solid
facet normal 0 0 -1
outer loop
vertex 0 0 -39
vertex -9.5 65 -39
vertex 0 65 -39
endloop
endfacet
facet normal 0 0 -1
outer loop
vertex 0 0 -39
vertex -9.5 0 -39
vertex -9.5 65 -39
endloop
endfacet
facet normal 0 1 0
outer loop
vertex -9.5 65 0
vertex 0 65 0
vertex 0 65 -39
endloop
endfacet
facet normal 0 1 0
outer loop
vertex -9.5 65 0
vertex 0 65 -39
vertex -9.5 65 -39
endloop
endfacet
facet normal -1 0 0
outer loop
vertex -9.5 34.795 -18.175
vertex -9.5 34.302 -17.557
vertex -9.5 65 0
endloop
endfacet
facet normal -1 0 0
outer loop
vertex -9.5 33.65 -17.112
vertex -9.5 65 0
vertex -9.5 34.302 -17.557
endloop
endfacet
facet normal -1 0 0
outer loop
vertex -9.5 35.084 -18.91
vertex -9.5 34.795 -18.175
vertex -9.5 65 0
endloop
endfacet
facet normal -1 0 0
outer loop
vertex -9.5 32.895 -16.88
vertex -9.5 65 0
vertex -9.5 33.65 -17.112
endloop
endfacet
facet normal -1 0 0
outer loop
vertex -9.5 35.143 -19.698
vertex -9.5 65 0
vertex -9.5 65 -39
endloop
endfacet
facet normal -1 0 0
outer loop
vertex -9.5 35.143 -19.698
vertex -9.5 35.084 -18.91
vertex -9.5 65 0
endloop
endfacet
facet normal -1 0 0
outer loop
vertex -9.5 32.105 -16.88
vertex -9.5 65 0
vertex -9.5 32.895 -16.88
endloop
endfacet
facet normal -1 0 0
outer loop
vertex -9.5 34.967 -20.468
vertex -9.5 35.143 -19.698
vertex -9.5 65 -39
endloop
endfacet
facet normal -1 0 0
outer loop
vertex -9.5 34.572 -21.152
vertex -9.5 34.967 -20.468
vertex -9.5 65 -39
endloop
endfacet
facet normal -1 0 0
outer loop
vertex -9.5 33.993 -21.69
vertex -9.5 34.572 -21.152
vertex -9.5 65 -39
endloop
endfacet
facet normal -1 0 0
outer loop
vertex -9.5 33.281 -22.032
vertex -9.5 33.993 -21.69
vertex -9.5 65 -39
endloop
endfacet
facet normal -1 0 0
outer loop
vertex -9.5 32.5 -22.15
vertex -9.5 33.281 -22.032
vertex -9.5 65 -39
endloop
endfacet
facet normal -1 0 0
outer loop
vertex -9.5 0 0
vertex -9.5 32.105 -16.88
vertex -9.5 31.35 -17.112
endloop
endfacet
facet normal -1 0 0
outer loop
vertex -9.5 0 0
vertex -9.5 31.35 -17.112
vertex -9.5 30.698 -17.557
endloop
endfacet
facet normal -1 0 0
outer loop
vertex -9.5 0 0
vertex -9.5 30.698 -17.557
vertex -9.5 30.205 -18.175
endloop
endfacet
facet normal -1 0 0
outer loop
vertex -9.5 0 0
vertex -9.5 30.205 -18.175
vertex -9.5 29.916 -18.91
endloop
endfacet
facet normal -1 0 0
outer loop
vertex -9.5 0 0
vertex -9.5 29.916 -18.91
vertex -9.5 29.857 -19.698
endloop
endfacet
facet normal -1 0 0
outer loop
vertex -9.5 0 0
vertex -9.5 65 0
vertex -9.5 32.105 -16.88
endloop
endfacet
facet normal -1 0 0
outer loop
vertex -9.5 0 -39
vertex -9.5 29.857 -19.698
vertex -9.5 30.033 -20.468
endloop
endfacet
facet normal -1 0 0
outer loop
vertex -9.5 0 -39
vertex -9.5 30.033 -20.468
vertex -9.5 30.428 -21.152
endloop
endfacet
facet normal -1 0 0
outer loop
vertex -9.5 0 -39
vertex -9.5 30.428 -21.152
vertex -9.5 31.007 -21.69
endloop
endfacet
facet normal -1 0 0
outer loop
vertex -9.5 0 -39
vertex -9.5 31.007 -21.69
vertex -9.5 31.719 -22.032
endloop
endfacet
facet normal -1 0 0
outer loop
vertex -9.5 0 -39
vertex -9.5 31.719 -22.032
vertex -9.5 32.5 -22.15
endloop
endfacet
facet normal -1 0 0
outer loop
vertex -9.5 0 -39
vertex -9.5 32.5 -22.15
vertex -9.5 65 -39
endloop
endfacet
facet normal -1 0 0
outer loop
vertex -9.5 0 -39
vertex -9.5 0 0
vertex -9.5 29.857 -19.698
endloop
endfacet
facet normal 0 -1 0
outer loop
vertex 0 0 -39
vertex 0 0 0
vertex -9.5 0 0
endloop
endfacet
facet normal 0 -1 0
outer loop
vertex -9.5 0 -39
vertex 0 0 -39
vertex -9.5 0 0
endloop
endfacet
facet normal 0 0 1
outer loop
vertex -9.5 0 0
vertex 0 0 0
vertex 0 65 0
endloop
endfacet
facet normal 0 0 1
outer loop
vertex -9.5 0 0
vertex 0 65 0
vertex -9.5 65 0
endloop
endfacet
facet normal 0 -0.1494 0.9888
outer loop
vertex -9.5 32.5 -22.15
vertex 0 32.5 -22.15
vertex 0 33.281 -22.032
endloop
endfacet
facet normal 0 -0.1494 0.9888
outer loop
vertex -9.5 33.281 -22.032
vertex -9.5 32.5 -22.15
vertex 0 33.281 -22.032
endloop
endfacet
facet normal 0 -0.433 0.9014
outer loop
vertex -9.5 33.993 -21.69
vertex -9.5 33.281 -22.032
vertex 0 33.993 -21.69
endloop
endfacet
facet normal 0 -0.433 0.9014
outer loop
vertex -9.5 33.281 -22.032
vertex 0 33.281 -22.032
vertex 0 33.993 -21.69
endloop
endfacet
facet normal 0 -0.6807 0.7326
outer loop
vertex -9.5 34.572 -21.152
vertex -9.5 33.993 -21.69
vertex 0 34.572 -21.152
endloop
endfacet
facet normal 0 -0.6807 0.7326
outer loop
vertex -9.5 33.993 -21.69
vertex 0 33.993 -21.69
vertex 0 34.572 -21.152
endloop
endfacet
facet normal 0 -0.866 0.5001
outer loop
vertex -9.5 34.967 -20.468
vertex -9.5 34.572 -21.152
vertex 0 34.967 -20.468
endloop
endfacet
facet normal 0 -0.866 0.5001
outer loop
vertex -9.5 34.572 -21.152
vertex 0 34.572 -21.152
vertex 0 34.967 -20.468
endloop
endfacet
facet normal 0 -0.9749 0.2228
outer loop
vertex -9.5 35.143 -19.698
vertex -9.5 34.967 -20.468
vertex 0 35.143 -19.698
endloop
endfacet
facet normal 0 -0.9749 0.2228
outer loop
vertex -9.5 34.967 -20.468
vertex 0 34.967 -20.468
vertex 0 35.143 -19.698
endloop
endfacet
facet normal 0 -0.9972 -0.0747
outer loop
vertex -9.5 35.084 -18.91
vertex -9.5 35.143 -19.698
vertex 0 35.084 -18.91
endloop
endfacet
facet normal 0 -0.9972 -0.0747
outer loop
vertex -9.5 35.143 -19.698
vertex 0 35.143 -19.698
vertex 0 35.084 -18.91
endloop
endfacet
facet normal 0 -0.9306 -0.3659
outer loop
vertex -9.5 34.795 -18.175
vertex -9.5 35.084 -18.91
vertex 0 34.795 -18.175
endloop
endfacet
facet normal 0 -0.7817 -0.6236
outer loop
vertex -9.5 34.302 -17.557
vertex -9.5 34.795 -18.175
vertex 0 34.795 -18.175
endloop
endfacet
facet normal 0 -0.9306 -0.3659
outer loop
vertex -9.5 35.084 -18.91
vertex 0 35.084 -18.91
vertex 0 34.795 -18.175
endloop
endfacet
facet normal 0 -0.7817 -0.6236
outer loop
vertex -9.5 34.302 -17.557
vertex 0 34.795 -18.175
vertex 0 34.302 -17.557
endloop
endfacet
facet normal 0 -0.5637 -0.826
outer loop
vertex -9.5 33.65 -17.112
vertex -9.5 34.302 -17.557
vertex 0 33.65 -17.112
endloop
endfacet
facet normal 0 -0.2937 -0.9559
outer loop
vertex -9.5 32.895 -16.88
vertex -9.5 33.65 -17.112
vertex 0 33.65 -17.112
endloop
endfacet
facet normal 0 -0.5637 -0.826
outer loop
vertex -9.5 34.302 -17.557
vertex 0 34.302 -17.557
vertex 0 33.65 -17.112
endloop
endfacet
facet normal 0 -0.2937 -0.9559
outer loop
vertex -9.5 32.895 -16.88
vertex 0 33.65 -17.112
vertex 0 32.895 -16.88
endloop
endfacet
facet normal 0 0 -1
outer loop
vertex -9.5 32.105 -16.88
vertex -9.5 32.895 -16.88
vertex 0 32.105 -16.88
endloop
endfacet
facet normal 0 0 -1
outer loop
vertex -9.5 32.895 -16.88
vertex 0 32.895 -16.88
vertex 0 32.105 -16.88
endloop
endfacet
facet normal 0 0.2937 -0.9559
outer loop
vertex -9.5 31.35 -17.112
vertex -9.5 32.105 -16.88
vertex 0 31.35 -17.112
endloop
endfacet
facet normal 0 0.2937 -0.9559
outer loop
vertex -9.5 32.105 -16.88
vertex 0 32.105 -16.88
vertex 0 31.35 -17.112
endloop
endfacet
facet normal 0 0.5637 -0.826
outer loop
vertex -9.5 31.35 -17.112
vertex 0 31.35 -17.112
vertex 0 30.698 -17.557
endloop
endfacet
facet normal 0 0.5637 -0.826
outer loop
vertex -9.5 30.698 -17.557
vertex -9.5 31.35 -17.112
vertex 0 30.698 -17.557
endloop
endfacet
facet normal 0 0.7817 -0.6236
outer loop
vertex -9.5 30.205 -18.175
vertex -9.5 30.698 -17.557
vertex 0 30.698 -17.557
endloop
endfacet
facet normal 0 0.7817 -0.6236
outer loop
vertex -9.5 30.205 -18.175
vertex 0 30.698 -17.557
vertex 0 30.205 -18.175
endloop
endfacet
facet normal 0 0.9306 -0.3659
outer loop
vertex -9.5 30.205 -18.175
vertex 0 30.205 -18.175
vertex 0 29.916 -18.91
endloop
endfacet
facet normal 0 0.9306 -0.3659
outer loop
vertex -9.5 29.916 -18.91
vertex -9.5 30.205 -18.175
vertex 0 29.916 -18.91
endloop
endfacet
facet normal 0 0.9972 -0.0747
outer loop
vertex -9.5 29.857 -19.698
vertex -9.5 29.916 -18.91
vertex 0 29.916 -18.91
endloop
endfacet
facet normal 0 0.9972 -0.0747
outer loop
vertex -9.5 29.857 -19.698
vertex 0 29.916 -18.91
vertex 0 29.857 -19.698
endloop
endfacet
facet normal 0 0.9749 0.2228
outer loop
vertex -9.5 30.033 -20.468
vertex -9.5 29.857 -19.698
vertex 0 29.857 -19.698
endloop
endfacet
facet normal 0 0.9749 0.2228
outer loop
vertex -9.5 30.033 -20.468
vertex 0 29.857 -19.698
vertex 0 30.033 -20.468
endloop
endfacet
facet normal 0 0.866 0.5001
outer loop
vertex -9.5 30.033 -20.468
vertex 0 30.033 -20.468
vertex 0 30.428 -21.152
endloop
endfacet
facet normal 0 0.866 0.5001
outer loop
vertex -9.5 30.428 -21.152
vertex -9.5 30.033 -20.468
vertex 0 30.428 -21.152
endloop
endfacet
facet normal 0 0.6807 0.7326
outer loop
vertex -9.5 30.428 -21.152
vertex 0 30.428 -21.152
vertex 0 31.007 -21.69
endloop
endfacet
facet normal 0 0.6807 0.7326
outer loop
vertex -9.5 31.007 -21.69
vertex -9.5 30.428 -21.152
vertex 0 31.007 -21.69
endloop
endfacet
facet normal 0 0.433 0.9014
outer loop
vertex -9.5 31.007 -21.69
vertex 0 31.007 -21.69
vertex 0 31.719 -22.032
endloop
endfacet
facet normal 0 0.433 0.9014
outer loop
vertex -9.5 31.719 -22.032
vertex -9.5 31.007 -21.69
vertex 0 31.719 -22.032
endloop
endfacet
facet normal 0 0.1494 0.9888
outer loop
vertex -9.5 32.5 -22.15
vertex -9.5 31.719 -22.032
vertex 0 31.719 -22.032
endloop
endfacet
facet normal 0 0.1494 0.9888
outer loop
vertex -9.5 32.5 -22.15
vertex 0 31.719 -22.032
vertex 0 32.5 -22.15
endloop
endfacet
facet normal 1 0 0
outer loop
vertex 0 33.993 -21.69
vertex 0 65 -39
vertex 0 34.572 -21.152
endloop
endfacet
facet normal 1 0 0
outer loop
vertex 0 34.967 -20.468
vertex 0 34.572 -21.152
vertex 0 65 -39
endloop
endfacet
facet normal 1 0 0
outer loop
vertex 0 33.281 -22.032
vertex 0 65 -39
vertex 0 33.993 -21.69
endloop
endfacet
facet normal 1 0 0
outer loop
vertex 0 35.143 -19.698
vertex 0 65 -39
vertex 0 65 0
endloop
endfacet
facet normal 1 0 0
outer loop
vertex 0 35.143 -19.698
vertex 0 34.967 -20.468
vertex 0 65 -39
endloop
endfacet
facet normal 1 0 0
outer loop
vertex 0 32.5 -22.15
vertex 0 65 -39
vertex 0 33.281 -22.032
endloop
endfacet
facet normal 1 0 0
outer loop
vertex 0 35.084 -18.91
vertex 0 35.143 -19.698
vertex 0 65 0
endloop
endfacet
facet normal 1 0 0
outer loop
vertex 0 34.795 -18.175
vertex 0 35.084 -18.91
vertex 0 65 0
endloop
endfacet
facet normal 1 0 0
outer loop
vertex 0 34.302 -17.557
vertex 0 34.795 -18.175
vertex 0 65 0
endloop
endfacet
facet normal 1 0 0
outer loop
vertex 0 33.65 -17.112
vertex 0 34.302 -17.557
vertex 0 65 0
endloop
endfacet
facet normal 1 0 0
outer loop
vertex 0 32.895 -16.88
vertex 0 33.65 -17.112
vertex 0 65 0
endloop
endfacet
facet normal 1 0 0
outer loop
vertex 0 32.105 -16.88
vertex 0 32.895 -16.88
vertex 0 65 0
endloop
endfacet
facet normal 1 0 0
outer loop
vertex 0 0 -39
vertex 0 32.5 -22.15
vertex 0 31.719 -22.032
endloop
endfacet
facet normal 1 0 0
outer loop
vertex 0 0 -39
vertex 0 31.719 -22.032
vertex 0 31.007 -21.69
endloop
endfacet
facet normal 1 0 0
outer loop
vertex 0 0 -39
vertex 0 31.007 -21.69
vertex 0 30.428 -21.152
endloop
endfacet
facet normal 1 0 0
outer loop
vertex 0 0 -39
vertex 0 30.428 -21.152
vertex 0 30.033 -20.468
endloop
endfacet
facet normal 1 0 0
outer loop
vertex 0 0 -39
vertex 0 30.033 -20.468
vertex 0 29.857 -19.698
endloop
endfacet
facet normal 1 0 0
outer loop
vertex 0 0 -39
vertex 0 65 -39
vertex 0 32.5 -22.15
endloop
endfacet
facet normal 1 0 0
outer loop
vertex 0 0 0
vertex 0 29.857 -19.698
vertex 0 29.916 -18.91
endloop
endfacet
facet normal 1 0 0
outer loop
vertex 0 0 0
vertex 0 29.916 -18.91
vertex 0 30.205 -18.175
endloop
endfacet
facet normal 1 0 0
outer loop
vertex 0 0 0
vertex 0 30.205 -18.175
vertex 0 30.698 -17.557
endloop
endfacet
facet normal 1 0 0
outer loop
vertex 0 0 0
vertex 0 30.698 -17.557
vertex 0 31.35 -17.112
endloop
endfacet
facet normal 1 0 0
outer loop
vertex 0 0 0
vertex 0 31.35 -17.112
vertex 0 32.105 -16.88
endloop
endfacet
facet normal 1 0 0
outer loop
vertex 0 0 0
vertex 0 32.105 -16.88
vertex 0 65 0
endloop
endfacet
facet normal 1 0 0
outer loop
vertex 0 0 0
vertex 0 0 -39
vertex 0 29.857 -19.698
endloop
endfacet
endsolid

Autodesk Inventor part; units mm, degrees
ref_plane "YZ Plane" through (0, 0, 0) normal (1, 0, 0) x (0, 1, 0)
ref_plane "XZ Plane" through (0, 0, 0) normal (0, 1, 0) x (-1, 0, 0)
ref_plane "XY Plane" through (0, 0, 0) normal (0, 0, 1) x (1, 0, 0)
sketch "Sketch1" plane through (0, 0, 0) normal (0, 1, 0) x (-1, 0, 0)
  line L0 (0, 0) -> (9.5, 0)
  line L1 (9.5, 0) -> (9.5, -39)
  line L2 (9.5, -39) -> (0, -39)
  line L3 (0, -39) -> (0, 0)
  dimension "d0" = 9.5
  dimension "d2" = 39
extrude "Extrusion1" add sketch "Sketch1" along normal blind 65
sketch "Sketch2" plane through (0, 0, 0) normal (1, 0, 0) x (0, 0, -1)
  line L0 (39, 65) -> (0, 65) projected
  line L1 (0, 65) -> (39, 0)
  circle A0 centre (19.5, 32.5) radius 2.65
  point P0 (0, 0)
  dimension "d5" = 5.3
extrude "Extrusion2" cut sketch "Sketch2" against normal through all
properties part number "TENSOR"
